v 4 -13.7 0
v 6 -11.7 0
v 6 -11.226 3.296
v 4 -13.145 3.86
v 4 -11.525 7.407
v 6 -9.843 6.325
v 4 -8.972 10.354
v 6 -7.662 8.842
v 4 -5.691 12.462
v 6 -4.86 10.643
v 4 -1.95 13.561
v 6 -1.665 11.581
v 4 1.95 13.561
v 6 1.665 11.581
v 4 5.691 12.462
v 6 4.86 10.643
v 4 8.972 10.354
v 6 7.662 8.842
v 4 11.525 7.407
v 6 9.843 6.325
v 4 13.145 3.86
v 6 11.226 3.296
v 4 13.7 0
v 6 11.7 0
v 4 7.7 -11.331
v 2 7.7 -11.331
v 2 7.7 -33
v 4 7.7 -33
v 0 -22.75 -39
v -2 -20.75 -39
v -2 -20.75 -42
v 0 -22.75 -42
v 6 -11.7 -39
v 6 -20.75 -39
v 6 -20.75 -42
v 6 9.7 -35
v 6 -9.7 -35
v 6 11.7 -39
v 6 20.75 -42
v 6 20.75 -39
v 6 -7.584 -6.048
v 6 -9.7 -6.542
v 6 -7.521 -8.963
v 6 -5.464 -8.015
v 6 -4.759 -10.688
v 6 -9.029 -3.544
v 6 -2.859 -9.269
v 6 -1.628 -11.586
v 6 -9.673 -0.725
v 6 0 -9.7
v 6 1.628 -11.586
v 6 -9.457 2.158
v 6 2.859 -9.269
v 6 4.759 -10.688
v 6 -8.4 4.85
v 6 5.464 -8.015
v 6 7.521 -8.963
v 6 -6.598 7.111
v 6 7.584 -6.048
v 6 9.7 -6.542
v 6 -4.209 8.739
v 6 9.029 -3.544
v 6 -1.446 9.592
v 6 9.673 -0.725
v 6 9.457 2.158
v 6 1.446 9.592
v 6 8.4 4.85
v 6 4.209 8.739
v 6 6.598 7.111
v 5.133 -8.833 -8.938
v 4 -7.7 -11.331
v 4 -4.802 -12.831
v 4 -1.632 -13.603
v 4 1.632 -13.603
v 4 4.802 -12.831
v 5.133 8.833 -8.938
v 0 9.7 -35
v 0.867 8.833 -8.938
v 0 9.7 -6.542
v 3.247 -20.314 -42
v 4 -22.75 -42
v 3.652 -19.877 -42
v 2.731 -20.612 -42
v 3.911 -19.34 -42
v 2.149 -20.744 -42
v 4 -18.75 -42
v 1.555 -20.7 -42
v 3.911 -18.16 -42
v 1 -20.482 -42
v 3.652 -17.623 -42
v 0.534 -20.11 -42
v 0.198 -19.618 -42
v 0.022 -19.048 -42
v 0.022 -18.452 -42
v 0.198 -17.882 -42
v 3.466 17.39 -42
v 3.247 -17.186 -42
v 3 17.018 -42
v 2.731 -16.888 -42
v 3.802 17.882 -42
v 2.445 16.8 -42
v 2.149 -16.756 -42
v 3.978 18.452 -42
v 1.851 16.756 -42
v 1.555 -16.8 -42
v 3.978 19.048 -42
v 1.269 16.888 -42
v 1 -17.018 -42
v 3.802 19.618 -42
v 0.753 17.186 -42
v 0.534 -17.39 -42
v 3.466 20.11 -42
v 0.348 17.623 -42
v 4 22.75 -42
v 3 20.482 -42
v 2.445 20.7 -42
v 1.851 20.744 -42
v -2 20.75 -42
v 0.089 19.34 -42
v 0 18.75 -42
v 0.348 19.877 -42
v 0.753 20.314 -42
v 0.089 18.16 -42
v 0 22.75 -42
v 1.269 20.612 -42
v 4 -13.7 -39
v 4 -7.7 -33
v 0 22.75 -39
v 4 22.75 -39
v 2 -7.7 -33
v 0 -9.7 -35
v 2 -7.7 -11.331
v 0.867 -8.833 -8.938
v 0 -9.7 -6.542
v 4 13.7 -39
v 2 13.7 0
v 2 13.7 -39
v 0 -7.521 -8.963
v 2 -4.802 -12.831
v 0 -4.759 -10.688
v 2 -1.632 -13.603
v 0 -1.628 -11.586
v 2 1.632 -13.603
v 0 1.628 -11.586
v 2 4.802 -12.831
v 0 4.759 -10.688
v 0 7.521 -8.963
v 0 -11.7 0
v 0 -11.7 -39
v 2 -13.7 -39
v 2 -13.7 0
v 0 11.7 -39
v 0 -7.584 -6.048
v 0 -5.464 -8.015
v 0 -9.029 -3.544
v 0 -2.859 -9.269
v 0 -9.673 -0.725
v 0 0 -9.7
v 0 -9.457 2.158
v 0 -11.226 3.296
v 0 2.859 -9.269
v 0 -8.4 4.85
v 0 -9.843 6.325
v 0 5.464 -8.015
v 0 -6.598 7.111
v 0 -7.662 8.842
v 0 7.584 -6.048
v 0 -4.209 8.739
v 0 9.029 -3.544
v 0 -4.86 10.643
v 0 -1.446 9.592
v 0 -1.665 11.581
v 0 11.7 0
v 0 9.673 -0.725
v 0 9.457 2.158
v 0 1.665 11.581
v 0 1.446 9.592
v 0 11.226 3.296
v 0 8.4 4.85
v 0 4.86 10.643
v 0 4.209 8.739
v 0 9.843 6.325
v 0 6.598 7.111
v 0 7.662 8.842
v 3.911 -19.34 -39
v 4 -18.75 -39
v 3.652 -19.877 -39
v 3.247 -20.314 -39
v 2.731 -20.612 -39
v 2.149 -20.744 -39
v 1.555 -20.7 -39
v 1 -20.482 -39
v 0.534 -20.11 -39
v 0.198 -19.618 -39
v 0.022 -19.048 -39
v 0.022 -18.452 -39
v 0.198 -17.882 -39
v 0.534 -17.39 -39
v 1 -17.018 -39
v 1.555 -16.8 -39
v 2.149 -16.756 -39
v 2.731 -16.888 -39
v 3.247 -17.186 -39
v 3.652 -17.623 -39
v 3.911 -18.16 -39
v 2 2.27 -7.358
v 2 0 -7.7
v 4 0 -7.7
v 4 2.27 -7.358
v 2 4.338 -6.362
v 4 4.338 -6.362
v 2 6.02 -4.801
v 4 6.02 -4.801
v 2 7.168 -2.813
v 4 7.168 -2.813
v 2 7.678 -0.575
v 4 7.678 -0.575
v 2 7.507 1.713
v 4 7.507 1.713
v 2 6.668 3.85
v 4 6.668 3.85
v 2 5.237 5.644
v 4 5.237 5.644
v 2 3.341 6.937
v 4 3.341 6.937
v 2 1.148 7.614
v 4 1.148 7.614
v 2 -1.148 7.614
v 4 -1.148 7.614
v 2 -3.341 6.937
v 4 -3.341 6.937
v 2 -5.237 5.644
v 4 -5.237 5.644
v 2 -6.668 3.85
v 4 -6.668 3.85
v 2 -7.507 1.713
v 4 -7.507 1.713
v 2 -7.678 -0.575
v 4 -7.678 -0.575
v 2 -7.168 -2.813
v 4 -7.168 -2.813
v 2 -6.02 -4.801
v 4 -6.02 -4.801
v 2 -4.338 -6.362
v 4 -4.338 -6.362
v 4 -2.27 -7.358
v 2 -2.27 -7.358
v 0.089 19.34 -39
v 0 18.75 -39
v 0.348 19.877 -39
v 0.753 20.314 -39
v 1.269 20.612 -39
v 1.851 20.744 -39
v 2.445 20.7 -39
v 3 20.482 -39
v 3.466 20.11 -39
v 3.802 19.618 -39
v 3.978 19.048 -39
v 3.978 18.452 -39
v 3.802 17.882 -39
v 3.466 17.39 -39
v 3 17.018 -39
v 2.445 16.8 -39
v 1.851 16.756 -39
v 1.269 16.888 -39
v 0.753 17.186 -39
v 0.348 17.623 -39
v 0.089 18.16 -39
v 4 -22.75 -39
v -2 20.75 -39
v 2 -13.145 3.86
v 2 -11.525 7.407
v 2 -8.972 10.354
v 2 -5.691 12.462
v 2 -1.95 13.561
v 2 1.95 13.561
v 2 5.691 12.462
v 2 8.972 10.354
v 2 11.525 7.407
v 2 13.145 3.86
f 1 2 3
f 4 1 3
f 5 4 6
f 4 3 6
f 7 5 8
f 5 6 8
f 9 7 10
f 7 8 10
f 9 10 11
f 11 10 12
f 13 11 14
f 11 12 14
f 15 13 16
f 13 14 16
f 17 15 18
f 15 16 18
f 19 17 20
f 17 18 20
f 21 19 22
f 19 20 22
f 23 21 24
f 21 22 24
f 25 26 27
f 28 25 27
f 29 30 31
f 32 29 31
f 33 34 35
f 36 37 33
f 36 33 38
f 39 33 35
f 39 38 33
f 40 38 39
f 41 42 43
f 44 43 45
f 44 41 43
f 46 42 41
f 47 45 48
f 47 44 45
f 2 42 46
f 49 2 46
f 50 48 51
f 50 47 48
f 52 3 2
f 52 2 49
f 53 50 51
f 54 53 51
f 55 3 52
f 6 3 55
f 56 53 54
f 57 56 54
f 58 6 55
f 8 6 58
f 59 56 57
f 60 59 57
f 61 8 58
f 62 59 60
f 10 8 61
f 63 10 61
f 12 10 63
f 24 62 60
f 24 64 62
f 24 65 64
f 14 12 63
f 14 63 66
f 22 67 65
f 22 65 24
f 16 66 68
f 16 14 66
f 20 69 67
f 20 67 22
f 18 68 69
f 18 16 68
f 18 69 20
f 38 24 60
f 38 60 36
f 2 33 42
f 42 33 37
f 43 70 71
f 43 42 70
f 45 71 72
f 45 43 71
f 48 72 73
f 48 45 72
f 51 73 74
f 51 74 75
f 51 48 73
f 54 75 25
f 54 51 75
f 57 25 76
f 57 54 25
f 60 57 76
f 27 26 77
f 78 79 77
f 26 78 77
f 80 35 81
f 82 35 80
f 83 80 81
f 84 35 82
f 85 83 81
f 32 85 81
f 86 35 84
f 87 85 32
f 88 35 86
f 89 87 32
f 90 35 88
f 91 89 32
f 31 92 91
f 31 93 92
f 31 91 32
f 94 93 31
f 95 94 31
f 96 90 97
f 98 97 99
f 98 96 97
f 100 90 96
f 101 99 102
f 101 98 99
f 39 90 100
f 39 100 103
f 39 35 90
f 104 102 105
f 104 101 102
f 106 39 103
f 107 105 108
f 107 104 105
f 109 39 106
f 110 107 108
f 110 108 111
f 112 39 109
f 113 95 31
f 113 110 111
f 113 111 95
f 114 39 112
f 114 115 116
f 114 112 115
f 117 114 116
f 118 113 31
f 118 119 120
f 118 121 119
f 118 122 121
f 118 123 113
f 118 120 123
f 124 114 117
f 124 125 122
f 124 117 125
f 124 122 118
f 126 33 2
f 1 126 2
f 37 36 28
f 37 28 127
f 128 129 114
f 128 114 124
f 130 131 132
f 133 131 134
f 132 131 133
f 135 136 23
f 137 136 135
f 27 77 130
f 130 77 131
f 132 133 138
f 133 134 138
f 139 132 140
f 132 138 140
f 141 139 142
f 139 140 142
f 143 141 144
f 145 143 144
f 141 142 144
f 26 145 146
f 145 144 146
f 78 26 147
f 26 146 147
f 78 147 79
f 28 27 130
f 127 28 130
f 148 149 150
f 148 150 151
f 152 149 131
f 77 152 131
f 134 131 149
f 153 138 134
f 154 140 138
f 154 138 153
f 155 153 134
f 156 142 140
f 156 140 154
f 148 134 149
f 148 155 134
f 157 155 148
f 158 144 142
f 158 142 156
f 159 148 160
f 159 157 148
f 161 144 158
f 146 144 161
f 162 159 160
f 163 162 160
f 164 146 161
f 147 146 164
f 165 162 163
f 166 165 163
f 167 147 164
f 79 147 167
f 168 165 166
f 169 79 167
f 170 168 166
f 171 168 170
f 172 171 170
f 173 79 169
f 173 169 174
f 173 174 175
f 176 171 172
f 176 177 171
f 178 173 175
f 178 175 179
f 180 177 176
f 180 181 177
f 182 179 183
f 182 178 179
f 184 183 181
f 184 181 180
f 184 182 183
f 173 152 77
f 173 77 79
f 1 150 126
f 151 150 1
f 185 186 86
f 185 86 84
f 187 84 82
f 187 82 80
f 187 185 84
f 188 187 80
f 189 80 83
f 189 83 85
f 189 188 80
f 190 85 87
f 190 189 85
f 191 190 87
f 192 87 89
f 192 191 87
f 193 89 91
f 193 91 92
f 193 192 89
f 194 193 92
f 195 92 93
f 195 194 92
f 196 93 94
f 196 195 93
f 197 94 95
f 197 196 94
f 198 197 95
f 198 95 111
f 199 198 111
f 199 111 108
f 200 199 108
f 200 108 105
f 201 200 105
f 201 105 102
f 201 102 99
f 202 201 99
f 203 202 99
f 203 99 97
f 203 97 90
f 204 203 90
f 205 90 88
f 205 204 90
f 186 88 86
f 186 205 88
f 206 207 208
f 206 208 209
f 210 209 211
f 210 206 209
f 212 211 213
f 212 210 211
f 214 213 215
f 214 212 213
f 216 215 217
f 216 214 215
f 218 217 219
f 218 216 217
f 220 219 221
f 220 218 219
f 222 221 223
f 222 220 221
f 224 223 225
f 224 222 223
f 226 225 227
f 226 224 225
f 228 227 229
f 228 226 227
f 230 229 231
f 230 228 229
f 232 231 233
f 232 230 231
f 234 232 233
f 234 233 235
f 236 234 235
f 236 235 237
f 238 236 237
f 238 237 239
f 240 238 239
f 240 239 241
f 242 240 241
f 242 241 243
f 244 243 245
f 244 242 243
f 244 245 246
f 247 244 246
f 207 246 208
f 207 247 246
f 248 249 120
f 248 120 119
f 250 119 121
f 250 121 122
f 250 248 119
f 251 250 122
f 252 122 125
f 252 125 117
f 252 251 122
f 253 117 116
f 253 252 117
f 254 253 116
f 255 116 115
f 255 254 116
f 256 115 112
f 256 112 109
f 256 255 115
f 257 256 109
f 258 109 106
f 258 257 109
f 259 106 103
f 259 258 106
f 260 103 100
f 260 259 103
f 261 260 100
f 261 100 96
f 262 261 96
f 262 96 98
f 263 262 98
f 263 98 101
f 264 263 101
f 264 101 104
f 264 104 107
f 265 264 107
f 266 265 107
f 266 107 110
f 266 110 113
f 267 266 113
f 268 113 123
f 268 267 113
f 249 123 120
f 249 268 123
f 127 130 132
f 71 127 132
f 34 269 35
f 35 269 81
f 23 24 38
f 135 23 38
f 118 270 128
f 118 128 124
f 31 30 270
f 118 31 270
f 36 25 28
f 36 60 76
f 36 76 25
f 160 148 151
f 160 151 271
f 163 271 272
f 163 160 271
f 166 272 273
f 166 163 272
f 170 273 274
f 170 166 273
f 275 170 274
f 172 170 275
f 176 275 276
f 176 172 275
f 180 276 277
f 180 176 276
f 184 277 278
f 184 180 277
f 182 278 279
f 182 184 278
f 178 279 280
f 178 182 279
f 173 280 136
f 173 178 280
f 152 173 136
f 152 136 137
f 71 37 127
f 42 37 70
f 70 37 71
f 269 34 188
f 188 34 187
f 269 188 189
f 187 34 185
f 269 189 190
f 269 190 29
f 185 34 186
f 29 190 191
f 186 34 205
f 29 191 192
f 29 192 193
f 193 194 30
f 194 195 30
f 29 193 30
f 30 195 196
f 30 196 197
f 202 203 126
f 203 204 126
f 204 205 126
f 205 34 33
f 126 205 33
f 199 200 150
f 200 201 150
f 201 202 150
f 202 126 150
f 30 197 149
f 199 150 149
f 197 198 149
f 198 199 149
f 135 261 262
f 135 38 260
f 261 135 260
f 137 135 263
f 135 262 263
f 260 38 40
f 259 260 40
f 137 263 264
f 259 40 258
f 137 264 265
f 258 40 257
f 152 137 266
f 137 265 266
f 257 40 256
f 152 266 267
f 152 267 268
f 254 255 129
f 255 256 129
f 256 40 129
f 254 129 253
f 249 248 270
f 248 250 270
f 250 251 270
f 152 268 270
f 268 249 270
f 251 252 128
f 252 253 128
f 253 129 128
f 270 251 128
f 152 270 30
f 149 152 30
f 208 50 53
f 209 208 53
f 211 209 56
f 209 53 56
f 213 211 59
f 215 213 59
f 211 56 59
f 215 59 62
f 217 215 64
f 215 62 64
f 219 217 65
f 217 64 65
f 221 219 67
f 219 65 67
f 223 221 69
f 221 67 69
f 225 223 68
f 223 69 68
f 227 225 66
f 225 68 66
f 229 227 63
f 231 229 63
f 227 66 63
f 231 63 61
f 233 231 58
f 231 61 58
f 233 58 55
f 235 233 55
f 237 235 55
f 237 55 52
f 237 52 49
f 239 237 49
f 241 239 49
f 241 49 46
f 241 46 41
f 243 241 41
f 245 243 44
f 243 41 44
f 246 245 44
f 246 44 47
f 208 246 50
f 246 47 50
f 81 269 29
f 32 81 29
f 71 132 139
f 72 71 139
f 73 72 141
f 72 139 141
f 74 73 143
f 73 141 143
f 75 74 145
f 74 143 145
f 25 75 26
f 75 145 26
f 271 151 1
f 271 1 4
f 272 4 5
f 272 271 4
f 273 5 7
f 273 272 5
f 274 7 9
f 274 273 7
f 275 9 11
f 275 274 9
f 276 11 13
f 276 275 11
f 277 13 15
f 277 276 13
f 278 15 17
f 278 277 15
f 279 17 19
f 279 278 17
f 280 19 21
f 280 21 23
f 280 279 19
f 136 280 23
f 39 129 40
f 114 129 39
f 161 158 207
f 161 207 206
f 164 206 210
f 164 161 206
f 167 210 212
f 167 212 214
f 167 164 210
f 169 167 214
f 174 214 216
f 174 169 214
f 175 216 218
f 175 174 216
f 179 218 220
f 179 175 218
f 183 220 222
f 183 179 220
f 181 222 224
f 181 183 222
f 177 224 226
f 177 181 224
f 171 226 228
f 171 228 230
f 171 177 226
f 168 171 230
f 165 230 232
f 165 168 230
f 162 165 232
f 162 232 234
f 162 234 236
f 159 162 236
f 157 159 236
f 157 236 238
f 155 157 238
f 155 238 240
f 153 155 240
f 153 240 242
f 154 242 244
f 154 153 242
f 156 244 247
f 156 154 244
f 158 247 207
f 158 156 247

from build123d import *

# Parameters (mm, degrees)
SKETCH1_R           = 7.7
BOSS_EXTRUDE1_DEPTH = 6
CHAMFER1_SIZE       = 2
SKETCH4_W           = 8
SKETCH4_H           = 45.5
SKETCH4_R           = 2
BOSS_EXTRUDE2_DEPTH = 3
CHAMFER2_SIZE       = 2


with BuildPart() as part:
    # Sketch1 → Boss-Extrude1 (new body)
    with BuildSketch(Plane(origin=(0, 0, 0), x_dir=(0, 0, -1), z_dir=(1, 0, 0))):
        with BuildLine():
            Line((0, 13.7), (39, 13.7))
            Line((39, 13.7), (39, -13.7))
            Line((39, -13.7), (0, -13.7))
            ThreePointArc((0, -13.7), (-13.7, 0), (0, 13.7))
        make_face()
        Circle(SKETCH1_R, mode=Mode.SUBTRACT)
        with BuildLine():
            Line((11.331372379, 7.7), (33, 7.7))
            Line((33, 7.7), (33, -7.7))
            Line((33, -7.7), (11.331372379, -7.7))
            ThreePointArc((11.331372379, -7.7), (13.7, 0), (11.331372379, 7.7))
        make_face(mode=Mode.SUBTRACT)
    extrude(amount=BOSS_EXTRUDE1_DEPTH)

    # Chamfer1
    chamfer1_edges = [part.edges().sort_by_distance(p)[0] for p in [
        (6, 13.7, -19.5),
        (0, 0, -33),
        (0, 7.7, -22.16568619),
        (0, 0, -13.7),
        (0, -7.7, -22.16568619),
        (6, 0, -33),
        (6, 7.7, -22.16568619),
        (6, 0, -13.7),
        (6, -7.7, -22.16568619),
        (0, 0, 7.7),
        (6, 0, 7.7),
        (6, 0, 13.7),
        (0, 13.7, -19.5),
        (0, -13.7, -19.5),
        (0, 0, 13.7),
        (6, -13.7, -19.5),
    ]]
    chamfer(chamfer1_edges, length=CHAMFER1_SIZE)

    # Sketch4 → Boss-Extrude2 (add)
    with BuildSketch(Plane(origin=(0, 0, -39), x_dir=(-1, 0, 0), z_dir=(0, 0, -1))):
        with Locations((-2, 0)):
            Rectangle(SKETCH4_W, SKETCH4_H)
        with Locations((-2, 18.75)):
            Circle(SKETCH4_R, mode=Mode.SUBTRACT)
        with Locations(Location((-2, -18.75, 0), (0, 0, 180))):
            Circle(SKETCH4_R, mode=Mode.SUBTRACT)
    extrude(amount=BOSS_EXTRUDE2_DEPTH)

    # Chamfer2
    chamfer2_edges = [part.edges().sort_by_distance(p)[0] for p in [
        (6, -22.75, -40.5),
        (-2, -22.75, -40.5),
        (6, 22.75, -40.5),
        (-2, 22.75, -40.5),
    ]]
    chamfer(chamfer2_edges, length=CHAMFER2_SIZE)


solid = part.part
